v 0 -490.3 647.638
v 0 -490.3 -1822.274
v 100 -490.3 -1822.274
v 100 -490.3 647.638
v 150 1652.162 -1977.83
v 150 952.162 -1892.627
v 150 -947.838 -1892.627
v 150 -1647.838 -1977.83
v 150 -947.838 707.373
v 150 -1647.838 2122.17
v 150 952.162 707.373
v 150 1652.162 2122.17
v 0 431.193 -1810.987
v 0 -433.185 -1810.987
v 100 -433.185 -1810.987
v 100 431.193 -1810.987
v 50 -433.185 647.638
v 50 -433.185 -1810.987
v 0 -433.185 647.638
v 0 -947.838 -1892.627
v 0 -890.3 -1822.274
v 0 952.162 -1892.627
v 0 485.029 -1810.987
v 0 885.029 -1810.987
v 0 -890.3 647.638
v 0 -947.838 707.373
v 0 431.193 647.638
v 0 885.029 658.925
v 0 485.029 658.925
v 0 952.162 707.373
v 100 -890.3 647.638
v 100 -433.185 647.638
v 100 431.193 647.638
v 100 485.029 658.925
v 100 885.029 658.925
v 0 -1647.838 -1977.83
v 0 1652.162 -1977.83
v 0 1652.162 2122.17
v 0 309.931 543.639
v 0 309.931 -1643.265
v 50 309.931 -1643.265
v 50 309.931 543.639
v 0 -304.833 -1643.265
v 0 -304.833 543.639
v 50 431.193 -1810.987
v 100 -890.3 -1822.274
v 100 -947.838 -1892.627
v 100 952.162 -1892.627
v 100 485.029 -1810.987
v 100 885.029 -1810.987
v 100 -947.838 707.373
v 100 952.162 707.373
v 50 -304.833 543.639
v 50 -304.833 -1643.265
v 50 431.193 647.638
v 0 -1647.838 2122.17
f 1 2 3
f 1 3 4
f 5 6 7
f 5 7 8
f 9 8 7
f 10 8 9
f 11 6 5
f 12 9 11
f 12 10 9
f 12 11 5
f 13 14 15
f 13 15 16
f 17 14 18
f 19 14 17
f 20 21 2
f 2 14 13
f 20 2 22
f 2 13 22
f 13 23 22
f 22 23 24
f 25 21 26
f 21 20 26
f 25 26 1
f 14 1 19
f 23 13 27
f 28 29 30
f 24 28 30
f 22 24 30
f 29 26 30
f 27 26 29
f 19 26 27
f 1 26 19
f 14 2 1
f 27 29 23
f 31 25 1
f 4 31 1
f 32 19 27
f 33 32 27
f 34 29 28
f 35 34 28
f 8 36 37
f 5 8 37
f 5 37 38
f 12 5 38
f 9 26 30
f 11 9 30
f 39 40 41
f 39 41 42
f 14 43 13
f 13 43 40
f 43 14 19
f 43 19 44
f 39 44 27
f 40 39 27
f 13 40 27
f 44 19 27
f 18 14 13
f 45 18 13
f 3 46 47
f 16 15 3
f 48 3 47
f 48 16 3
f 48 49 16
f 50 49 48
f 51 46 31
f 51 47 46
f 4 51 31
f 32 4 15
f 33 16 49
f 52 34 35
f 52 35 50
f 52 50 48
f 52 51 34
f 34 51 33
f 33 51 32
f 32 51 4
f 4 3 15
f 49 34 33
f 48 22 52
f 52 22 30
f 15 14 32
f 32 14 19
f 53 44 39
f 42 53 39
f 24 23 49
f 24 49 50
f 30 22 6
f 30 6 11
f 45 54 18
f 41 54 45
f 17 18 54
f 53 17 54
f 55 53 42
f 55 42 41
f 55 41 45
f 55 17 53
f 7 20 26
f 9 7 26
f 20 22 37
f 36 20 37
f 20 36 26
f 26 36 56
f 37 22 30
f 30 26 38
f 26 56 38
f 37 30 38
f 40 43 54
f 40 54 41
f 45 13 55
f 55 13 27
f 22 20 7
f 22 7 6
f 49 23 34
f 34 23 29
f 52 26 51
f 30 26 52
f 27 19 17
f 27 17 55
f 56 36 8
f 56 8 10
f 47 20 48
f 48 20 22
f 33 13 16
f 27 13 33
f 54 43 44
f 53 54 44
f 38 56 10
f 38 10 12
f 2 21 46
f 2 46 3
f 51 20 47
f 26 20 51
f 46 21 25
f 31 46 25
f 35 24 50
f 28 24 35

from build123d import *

# Parameters (mm, degrees)
F0_W     = 3300
F0_H     = 4100
F0_W_2   = 1900
F0_H_2   = 2600
F1_DEPTH = 150
F0_W_3   = 400
F0_H_3   = 2469.911873
F0_W_4   = 864.378304
F0_H_4   = 2458.624956
F0_H_5   = 2469.911874
F2_DEPTH = 100
F0_W_5   = 614.763677
F0_H_6   = 2186.903954
F3_DEPTH = 50


with BuildPart() as f1:
    # F0 (on Right) → F1 (new body)
    with BuildSketch(Plane.YZ):
        with Locations((2.16179, 72.170403)):
            Rectangle(F0_W, F0_H)
        with Locations((2.16179, -592.627478)):
            Rectangle(F0_W_2, F0_H_2, mode=Mode.SUBTRACT)
    extrude(amount=F1_DEPTH)


with BuildPart() as f2:
    # F0 (on Right) → F2 (new body)
    with BuildSketch(Plane.YZ):
        with Locations((2.16179, -592.627478)):
            Rectangle(F0_W_2, F0_H_2)
        with Locations((-690.299976, -587.317913)):
            Rectangle(F0_W_3, F0_H_3, mode=Mode.SUBTRACT)
        with Locations((-0.99577, -581.674455)):
            Rectangle(F0_W_4, F0_H_4, mode=Mode.SUBTRACT)
        with Locations((685.029149, -576.030996)):
            Rectangle(F0_W_3, F0_H_5, mode=Mode.SUBTRACT)
    extrude(amount=F2_DEPTH)


with BuildPart() as f3:
    # F0 (on Right) → F3 (new body)
    with BuildSketch(Plane.YZ):
        with Locations((-0.99577, -581.674455)):
            Rectangle(F0_W_4, F0_H_4)
        with Locations((2.548904, -549.81339)):
            Rectangle(F0_W_5, F0_H_6, mode=Mode.SUBTRACT)
    extrude(amount=F3_DEPTH)


solid = Compound([f1.part, f2.part, f3.part])
